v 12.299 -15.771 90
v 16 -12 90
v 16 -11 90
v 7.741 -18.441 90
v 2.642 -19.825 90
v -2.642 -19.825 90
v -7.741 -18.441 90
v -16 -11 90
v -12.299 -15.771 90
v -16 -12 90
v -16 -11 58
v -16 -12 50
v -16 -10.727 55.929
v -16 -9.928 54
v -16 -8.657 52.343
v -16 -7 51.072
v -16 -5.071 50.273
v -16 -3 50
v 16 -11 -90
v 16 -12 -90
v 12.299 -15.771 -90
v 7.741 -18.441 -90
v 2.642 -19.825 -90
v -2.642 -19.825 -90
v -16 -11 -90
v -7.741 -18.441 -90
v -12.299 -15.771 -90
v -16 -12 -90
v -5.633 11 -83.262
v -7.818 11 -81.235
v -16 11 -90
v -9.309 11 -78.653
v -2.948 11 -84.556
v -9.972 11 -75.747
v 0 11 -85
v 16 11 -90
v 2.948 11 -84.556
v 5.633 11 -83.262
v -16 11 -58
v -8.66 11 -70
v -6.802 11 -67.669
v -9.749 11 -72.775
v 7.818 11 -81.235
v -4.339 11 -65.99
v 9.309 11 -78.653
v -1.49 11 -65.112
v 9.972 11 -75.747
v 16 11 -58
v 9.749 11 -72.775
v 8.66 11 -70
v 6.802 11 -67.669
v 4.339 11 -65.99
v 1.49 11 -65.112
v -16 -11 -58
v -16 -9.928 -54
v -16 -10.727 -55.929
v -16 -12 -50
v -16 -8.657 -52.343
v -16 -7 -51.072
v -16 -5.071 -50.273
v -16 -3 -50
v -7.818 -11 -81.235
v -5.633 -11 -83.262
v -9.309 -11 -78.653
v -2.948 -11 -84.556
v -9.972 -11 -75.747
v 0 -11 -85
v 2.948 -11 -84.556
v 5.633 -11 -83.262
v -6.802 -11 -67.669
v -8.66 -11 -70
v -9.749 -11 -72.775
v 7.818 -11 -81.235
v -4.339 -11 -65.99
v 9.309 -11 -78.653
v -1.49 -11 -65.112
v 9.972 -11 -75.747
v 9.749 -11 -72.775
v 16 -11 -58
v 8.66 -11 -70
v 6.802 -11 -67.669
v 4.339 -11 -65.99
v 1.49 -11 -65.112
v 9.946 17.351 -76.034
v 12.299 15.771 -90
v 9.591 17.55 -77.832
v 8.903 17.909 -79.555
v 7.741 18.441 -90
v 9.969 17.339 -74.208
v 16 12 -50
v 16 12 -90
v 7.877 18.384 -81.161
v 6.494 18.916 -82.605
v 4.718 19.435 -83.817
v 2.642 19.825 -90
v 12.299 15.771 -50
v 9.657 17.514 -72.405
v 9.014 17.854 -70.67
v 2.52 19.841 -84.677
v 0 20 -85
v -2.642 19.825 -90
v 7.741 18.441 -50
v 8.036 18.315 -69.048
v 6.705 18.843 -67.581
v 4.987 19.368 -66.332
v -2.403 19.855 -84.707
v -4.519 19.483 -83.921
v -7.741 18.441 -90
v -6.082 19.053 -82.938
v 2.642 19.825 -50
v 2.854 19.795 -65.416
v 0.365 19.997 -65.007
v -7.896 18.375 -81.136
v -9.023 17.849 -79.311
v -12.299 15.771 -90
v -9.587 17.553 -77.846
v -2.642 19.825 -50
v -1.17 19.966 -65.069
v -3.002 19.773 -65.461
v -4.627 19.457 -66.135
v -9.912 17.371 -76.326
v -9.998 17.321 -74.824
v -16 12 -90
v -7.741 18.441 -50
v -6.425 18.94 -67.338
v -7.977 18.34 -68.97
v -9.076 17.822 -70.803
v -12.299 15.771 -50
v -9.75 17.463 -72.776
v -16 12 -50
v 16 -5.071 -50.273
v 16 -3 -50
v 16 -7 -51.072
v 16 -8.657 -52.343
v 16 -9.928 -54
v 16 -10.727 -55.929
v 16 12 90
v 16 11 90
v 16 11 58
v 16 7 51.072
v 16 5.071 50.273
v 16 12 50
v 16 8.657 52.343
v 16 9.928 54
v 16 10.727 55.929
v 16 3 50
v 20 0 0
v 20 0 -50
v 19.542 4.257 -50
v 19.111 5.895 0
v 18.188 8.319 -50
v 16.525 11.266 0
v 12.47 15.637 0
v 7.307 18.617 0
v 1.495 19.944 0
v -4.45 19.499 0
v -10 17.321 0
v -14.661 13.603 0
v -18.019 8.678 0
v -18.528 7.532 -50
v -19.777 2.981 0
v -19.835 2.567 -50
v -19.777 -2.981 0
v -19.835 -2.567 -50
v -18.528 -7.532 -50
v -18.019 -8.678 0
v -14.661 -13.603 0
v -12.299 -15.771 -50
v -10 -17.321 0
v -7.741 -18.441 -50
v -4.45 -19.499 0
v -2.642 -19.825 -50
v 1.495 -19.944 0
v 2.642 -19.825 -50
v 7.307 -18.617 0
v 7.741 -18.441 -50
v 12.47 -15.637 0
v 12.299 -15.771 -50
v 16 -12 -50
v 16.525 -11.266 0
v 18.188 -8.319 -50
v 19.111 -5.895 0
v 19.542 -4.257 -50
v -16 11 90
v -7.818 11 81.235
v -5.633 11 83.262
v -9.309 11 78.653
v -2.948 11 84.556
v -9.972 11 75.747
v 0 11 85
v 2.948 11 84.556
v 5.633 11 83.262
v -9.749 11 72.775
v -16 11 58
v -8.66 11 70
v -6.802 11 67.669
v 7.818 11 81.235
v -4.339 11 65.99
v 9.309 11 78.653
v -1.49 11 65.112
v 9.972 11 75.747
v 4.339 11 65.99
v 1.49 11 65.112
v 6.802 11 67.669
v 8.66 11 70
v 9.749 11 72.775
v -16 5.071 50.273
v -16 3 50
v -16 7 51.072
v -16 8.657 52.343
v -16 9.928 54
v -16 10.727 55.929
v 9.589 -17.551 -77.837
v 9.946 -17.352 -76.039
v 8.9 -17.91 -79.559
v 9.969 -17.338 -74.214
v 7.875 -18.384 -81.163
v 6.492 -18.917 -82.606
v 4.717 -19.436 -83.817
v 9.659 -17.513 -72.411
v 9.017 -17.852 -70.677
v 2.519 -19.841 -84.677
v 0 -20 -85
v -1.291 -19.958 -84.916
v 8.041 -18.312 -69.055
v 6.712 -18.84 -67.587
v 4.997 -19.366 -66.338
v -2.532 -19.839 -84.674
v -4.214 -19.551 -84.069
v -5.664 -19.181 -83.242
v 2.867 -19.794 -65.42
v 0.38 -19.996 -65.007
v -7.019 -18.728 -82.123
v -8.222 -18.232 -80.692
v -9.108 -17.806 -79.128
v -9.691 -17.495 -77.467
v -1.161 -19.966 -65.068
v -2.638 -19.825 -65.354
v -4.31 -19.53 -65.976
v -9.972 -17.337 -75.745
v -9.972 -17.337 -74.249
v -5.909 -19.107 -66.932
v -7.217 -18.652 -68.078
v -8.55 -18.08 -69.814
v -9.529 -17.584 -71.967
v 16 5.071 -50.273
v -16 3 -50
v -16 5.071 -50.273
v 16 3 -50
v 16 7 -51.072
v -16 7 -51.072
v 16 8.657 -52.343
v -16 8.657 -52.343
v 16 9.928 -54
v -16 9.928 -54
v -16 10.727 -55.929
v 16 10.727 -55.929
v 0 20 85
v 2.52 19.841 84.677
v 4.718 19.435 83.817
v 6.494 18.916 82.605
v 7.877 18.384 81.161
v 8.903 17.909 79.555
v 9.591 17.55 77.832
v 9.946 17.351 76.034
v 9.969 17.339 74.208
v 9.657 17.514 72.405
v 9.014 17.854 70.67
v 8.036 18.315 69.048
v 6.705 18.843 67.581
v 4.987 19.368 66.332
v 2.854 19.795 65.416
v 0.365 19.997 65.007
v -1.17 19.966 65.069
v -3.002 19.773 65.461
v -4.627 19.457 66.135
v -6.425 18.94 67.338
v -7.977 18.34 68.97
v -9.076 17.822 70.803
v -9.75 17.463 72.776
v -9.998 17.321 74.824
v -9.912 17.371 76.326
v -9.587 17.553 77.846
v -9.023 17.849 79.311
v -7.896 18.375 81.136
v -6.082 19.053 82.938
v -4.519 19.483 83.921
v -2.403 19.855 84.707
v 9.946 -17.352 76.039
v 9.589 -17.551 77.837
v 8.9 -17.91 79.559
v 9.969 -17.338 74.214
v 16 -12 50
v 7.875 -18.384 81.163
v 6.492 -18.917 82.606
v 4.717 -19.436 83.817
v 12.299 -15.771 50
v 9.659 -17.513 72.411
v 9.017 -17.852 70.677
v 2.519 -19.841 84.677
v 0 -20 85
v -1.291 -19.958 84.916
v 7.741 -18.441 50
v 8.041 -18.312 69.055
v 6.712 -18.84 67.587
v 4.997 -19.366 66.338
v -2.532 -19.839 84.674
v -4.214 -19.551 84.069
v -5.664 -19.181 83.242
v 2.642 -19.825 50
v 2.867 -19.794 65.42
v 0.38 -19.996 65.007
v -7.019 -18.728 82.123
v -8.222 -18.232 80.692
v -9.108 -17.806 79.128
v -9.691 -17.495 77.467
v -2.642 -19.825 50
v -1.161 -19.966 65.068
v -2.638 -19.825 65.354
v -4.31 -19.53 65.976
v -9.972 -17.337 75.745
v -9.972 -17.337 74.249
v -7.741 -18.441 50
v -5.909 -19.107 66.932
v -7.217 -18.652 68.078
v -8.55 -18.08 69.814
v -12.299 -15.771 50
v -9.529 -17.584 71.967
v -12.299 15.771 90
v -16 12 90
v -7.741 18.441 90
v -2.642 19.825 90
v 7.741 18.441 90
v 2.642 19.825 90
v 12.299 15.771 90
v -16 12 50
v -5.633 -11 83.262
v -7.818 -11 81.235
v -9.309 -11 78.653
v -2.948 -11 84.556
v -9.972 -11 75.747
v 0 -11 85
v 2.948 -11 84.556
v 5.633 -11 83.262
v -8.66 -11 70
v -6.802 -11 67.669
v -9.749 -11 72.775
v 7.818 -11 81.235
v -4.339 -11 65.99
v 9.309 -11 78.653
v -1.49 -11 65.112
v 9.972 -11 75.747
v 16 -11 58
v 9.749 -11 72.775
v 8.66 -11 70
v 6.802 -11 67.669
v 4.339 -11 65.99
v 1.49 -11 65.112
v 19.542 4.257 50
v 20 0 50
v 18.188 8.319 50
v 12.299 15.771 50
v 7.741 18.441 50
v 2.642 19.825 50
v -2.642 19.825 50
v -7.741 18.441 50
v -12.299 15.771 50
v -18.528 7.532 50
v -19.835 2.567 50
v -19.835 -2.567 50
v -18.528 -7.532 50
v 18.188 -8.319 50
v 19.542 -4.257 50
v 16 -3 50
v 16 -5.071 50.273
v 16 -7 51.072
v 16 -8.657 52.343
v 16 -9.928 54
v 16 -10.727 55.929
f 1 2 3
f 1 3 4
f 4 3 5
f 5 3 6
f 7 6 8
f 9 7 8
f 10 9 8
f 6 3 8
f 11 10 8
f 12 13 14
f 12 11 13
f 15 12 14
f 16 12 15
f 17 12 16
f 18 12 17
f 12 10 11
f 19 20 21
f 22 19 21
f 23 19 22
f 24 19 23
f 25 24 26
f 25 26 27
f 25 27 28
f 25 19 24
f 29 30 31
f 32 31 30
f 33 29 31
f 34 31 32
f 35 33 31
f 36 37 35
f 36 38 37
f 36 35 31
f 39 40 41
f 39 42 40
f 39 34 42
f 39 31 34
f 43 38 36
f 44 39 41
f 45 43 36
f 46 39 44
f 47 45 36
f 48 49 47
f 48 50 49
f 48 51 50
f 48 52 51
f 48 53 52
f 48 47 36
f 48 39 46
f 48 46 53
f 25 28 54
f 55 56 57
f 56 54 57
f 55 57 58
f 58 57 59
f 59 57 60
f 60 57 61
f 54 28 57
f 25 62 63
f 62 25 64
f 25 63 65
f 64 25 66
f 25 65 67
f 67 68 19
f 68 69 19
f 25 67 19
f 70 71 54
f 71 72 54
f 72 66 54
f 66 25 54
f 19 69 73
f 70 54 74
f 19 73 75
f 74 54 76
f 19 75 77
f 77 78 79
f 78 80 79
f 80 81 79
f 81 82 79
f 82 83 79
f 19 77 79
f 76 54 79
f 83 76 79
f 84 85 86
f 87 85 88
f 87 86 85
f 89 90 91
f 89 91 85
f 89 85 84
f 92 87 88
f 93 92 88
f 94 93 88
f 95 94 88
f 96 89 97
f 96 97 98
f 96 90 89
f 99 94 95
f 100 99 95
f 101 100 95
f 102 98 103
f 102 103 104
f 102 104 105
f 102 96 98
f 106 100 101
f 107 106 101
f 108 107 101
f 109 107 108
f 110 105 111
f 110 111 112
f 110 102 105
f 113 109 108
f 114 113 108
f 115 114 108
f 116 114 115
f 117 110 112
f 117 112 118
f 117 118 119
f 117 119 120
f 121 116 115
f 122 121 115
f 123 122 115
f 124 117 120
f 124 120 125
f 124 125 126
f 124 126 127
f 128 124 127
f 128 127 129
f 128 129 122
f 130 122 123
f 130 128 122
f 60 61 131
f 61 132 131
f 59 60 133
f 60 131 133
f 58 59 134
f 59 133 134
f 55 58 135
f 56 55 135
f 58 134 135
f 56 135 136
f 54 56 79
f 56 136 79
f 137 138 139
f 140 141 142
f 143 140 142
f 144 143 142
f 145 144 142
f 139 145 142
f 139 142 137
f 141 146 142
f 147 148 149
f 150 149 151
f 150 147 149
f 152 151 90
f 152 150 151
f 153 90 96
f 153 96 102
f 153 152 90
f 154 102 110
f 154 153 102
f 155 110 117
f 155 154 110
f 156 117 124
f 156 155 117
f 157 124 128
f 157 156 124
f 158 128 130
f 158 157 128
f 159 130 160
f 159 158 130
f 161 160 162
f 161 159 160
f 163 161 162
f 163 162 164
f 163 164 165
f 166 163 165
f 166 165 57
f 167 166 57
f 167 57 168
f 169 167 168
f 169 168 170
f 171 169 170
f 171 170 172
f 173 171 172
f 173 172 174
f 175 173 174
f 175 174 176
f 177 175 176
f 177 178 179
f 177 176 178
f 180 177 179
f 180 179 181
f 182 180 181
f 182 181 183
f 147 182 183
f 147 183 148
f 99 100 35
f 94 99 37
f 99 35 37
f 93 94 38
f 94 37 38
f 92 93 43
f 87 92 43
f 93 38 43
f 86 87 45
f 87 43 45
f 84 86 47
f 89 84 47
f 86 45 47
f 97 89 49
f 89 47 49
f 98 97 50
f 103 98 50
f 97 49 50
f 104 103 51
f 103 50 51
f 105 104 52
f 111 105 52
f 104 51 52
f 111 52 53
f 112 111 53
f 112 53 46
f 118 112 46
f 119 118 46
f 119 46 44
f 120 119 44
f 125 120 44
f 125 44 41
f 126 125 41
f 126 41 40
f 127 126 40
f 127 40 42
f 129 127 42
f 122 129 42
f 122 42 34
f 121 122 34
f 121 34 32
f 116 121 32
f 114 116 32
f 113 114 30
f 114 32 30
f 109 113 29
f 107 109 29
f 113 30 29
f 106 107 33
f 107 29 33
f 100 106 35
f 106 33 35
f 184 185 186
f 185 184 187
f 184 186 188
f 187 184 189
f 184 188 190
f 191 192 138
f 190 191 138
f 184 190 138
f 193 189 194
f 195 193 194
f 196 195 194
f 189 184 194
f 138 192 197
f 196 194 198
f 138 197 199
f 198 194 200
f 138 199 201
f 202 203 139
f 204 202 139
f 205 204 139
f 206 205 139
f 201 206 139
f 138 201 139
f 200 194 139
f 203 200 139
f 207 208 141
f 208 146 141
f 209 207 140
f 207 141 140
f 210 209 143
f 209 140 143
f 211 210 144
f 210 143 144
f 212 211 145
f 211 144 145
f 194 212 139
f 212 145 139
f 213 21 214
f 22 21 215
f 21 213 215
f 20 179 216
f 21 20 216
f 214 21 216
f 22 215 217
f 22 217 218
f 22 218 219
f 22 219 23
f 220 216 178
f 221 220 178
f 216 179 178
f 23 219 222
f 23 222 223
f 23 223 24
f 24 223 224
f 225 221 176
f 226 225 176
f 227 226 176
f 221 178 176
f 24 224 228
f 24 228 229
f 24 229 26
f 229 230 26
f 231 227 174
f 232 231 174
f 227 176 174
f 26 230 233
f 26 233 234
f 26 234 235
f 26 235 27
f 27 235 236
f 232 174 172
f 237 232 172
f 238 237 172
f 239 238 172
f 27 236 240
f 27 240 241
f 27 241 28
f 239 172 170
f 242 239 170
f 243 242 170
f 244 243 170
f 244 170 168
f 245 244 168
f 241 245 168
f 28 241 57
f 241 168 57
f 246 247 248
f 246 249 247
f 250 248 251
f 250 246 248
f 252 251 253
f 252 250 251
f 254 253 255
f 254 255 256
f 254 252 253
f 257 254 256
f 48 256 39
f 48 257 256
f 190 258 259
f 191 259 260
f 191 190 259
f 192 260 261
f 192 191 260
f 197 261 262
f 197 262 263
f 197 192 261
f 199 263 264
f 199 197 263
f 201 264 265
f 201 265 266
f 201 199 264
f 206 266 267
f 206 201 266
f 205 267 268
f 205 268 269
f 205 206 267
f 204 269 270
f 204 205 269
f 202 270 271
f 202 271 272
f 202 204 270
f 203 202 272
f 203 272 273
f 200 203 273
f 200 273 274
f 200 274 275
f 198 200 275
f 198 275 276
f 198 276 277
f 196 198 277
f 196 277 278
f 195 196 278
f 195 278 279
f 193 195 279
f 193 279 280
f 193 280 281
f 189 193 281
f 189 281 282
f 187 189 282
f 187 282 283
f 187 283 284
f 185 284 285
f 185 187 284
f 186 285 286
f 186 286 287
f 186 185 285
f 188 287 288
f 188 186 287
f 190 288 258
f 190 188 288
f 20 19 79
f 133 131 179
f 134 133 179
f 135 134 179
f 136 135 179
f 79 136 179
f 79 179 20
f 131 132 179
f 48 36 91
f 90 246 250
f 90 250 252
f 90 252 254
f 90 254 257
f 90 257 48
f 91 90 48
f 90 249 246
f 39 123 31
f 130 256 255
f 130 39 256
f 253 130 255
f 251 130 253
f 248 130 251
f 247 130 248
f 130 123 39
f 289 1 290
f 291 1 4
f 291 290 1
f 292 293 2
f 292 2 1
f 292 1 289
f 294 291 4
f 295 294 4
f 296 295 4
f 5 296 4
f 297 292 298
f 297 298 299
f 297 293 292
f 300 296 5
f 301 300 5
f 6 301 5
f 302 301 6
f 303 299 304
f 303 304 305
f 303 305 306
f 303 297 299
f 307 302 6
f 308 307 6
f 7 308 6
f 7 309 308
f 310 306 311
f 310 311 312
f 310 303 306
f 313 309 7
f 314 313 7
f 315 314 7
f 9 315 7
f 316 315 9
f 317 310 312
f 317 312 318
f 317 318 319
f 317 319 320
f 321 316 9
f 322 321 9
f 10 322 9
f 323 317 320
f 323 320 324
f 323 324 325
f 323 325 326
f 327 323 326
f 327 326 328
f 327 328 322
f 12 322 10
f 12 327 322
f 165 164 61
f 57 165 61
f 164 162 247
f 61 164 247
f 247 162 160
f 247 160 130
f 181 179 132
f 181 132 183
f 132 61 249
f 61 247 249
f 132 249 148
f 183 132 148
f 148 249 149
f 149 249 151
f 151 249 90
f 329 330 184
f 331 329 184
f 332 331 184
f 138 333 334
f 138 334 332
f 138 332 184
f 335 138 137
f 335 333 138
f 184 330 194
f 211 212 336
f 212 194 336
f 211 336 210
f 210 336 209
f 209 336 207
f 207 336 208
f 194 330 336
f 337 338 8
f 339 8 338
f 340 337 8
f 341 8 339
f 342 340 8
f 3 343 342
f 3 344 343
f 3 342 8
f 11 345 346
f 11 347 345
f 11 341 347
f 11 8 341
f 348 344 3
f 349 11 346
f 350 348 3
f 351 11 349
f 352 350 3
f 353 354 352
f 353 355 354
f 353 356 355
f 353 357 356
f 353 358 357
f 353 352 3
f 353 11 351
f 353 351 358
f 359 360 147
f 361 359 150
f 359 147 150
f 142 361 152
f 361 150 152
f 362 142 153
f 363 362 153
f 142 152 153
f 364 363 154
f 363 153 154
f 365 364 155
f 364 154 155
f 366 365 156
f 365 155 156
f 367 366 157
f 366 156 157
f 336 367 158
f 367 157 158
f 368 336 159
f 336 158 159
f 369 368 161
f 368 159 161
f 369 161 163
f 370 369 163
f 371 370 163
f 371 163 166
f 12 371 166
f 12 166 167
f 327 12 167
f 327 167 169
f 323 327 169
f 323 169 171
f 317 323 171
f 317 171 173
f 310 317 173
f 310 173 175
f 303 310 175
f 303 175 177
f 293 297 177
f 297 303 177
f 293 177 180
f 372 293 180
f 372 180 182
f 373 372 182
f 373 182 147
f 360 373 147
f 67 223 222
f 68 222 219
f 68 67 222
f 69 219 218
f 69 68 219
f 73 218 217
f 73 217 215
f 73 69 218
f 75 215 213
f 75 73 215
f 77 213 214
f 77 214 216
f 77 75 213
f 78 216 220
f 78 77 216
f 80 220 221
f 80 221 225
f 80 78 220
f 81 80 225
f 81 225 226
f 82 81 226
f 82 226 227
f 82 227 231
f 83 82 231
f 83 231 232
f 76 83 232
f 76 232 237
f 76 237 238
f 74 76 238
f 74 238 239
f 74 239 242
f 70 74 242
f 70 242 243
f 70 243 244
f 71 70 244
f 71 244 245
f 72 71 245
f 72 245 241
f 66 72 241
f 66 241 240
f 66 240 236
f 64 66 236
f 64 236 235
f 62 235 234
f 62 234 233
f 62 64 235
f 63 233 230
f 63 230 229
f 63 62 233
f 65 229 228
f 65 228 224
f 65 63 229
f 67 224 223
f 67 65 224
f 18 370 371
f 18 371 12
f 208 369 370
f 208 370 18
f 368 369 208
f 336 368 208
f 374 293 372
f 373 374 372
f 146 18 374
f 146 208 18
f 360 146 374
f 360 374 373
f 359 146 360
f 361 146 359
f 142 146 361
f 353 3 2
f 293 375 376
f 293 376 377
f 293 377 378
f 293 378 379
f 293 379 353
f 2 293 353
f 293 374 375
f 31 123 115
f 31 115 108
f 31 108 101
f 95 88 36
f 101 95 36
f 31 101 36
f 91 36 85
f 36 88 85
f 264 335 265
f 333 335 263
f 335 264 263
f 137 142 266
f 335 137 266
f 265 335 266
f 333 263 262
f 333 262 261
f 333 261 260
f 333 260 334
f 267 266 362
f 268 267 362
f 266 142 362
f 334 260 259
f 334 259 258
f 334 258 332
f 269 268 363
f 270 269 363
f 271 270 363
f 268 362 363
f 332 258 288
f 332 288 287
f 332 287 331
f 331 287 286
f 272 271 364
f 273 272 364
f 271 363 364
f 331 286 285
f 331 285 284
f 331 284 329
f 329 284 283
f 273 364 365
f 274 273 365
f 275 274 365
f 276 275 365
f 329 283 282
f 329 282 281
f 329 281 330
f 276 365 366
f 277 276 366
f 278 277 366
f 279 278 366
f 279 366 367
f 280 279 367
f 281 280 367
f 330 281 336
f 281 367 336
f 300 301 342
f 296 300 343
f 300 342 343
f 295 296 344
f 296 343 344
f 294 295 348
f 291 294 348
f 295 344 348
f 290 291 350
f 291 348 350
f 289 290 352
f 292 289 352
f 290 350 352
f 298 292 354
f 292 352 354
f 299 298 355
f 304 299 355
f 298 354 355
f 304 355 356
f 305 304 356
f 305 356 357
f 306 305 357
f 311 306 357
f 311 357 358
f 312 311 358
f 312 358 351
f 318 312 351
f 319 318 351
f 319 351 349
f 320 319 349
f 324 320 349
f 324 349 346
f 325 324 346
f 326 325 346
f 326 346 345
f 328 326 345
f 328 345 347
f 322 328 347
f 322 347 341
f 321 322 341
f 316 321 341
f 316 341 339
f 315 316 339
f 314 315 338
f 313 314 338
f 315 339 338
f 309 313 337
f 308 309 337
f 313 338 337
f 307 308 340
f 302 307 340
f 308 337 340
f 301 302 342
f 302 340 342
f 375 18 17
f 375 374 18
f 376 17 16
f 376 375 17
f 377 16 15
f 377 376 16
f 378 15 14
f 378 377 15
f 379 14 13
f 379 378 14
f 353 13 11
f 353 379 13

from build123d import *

# Parameters (mm, degrees)
SZKIC1_R                               = 20
DODANIE_WYCI_GNI_CIE1_DEPTH            = 50
DODANIE_WYCI_GNI_CIE4_DEPTH            = 40
SZKIC7_R                               = 10
WYTNIJ_WYCI_GNI_CIE1_DEPTH             = 40
WYTNIJ_WYCI_GNI_CIE1_DIRECTION_2_REACH = 99.268
ZAOKR_GLENIE1_R                        = 8
ZAOKR_GLENIE1_OF_LUSTRO2_R             = 8


with BuildPart() as part:
    # Szkic1 → Dodanie-wyciągnięcie1 (new body)
    with BuildSketch(Plane.XY):
        Circle(SZKIC1_R)
    dodanie_wyci_gni_cie1 = extrude(amount=DODANIE_WYCI_GNI_CIE1_DEPTH)

    # Szkic6 → Dodanie-wyciągnięcie4 (add)
    with BuildSketch(Plane.XY.offset(50)):
        with BuildLine():
            Line((-16, 12), (-16, 11))
            Line((-16, 11), (16, 11))
            Line((16, 11), (16, 12))
            ThreePointArc((16, 12), (0, 20), (-16, 12))
        make_face()
        with BuildLine():
            Line((16, -11), (16, -12))
            ThreePointArc((16, -12), (0, -20), (-16, -12))
            Line((-16, -12), (-16, -11))
            Line((-16, -11), (16, -11))
        make_face()
    dodanie_wyci_gni_cie4 = extrude(amount=DODANIE_WYCI_GNI_CIE4_DEPTH)

    # Szkic7 → Wytnij-wyciągnięcie1 (cut)
    with BuildSketch(Plane(origin=(0, -11, 0), x_dir=(1, 0, 0), z_dir=(0, 1, 0))):
        with Locations(Location((0, -75, 0), (0, 0, 270))):
            Circle(SZKIC7_R)
    wytnij_wyci_gni_cie1 = extrude(amount=WYTNIJ_WYCI_GNI_CIE1_DEPTH, mode=Mode.SUBTRACT)

    # Szkic7 → Wytnij-wyciągnięcie1 direction 2 (cut, up to next)
    with BuildSketch(Plane(origin=(0, -11, 0), x_dir=(1, 0, 0), z_dir=(0, 1, 0)), mode=Mode.PRIVATE) as wytnij_wyci_gni_cie1_direction_2_sk1:
        with Locations(Location((0, -75, 0), (0, 0, 270))):
            Circle(SZKIC7_R)
    wytnij_wyci_gni_cie1_direction_2_tool1 = extrude(wytnij_wyci_gni_cie1_direction_2_sk1.sketch, amount=-WYTNIJ_WYCI_GNI_CIE1_DIRECTION_2_REACH, mode=Mode.PRIVATE) & part.part
    wytnij_wyci_gni_cie1_direction_2 = wytnij_wyci_gni_cie1_direction_2_tool1.solids().sort_by_distance((0, -11, 75))[0]
    add(wytnij_wyci_gni_cie1_direction_2, mode=Mode.SUBTRACT)

    # Zaokrąglenie1
    zaokr_glenie1_edges = [part.edges().sort_by_distance(p)[0] for p in [
        (0, -11, 50),
        (0, 11, 50),
    ]]
    fillet(zaokr_glenie1_edges, radius=ZAOKR_GLENIE1_R)

    # Lustro2: Dodanie-wyciągnięcie1, Dodanie-wyciągnięcie4, Wytnij-wyciągnięcie1, Wytnij-wyciągnięcie1 direction 2 across plane
    add(dodanie_wyci_gni_cie1.mirror(Plane.XY))
    add(dodanie_wyci_gni_cie4.mirror(Plane.XY))
    add(wytnij_wyci_gni_cie1.mirror(Plane.XY), mode=Mode.SUBTRACT)
    add(wytnij_wyci_gni_cie1_direction_2.mirror(Plane.XY), mode=Mode.SUBTRACT)

    # Zaokrąglenie1 of Lustro2
    zaokr_glenie1_of_lustro2_edges = [part.edges().sort_by_distance(p)[0] for p in [
        (0, -11, -50),
        (0, 11, -50),
    ]]
    fillet(zaokr_glenie1_of_lustro2_edges, radius=ZAOKR_GLENIE1_OF_LUSTRO2_R)


solid = part.part
